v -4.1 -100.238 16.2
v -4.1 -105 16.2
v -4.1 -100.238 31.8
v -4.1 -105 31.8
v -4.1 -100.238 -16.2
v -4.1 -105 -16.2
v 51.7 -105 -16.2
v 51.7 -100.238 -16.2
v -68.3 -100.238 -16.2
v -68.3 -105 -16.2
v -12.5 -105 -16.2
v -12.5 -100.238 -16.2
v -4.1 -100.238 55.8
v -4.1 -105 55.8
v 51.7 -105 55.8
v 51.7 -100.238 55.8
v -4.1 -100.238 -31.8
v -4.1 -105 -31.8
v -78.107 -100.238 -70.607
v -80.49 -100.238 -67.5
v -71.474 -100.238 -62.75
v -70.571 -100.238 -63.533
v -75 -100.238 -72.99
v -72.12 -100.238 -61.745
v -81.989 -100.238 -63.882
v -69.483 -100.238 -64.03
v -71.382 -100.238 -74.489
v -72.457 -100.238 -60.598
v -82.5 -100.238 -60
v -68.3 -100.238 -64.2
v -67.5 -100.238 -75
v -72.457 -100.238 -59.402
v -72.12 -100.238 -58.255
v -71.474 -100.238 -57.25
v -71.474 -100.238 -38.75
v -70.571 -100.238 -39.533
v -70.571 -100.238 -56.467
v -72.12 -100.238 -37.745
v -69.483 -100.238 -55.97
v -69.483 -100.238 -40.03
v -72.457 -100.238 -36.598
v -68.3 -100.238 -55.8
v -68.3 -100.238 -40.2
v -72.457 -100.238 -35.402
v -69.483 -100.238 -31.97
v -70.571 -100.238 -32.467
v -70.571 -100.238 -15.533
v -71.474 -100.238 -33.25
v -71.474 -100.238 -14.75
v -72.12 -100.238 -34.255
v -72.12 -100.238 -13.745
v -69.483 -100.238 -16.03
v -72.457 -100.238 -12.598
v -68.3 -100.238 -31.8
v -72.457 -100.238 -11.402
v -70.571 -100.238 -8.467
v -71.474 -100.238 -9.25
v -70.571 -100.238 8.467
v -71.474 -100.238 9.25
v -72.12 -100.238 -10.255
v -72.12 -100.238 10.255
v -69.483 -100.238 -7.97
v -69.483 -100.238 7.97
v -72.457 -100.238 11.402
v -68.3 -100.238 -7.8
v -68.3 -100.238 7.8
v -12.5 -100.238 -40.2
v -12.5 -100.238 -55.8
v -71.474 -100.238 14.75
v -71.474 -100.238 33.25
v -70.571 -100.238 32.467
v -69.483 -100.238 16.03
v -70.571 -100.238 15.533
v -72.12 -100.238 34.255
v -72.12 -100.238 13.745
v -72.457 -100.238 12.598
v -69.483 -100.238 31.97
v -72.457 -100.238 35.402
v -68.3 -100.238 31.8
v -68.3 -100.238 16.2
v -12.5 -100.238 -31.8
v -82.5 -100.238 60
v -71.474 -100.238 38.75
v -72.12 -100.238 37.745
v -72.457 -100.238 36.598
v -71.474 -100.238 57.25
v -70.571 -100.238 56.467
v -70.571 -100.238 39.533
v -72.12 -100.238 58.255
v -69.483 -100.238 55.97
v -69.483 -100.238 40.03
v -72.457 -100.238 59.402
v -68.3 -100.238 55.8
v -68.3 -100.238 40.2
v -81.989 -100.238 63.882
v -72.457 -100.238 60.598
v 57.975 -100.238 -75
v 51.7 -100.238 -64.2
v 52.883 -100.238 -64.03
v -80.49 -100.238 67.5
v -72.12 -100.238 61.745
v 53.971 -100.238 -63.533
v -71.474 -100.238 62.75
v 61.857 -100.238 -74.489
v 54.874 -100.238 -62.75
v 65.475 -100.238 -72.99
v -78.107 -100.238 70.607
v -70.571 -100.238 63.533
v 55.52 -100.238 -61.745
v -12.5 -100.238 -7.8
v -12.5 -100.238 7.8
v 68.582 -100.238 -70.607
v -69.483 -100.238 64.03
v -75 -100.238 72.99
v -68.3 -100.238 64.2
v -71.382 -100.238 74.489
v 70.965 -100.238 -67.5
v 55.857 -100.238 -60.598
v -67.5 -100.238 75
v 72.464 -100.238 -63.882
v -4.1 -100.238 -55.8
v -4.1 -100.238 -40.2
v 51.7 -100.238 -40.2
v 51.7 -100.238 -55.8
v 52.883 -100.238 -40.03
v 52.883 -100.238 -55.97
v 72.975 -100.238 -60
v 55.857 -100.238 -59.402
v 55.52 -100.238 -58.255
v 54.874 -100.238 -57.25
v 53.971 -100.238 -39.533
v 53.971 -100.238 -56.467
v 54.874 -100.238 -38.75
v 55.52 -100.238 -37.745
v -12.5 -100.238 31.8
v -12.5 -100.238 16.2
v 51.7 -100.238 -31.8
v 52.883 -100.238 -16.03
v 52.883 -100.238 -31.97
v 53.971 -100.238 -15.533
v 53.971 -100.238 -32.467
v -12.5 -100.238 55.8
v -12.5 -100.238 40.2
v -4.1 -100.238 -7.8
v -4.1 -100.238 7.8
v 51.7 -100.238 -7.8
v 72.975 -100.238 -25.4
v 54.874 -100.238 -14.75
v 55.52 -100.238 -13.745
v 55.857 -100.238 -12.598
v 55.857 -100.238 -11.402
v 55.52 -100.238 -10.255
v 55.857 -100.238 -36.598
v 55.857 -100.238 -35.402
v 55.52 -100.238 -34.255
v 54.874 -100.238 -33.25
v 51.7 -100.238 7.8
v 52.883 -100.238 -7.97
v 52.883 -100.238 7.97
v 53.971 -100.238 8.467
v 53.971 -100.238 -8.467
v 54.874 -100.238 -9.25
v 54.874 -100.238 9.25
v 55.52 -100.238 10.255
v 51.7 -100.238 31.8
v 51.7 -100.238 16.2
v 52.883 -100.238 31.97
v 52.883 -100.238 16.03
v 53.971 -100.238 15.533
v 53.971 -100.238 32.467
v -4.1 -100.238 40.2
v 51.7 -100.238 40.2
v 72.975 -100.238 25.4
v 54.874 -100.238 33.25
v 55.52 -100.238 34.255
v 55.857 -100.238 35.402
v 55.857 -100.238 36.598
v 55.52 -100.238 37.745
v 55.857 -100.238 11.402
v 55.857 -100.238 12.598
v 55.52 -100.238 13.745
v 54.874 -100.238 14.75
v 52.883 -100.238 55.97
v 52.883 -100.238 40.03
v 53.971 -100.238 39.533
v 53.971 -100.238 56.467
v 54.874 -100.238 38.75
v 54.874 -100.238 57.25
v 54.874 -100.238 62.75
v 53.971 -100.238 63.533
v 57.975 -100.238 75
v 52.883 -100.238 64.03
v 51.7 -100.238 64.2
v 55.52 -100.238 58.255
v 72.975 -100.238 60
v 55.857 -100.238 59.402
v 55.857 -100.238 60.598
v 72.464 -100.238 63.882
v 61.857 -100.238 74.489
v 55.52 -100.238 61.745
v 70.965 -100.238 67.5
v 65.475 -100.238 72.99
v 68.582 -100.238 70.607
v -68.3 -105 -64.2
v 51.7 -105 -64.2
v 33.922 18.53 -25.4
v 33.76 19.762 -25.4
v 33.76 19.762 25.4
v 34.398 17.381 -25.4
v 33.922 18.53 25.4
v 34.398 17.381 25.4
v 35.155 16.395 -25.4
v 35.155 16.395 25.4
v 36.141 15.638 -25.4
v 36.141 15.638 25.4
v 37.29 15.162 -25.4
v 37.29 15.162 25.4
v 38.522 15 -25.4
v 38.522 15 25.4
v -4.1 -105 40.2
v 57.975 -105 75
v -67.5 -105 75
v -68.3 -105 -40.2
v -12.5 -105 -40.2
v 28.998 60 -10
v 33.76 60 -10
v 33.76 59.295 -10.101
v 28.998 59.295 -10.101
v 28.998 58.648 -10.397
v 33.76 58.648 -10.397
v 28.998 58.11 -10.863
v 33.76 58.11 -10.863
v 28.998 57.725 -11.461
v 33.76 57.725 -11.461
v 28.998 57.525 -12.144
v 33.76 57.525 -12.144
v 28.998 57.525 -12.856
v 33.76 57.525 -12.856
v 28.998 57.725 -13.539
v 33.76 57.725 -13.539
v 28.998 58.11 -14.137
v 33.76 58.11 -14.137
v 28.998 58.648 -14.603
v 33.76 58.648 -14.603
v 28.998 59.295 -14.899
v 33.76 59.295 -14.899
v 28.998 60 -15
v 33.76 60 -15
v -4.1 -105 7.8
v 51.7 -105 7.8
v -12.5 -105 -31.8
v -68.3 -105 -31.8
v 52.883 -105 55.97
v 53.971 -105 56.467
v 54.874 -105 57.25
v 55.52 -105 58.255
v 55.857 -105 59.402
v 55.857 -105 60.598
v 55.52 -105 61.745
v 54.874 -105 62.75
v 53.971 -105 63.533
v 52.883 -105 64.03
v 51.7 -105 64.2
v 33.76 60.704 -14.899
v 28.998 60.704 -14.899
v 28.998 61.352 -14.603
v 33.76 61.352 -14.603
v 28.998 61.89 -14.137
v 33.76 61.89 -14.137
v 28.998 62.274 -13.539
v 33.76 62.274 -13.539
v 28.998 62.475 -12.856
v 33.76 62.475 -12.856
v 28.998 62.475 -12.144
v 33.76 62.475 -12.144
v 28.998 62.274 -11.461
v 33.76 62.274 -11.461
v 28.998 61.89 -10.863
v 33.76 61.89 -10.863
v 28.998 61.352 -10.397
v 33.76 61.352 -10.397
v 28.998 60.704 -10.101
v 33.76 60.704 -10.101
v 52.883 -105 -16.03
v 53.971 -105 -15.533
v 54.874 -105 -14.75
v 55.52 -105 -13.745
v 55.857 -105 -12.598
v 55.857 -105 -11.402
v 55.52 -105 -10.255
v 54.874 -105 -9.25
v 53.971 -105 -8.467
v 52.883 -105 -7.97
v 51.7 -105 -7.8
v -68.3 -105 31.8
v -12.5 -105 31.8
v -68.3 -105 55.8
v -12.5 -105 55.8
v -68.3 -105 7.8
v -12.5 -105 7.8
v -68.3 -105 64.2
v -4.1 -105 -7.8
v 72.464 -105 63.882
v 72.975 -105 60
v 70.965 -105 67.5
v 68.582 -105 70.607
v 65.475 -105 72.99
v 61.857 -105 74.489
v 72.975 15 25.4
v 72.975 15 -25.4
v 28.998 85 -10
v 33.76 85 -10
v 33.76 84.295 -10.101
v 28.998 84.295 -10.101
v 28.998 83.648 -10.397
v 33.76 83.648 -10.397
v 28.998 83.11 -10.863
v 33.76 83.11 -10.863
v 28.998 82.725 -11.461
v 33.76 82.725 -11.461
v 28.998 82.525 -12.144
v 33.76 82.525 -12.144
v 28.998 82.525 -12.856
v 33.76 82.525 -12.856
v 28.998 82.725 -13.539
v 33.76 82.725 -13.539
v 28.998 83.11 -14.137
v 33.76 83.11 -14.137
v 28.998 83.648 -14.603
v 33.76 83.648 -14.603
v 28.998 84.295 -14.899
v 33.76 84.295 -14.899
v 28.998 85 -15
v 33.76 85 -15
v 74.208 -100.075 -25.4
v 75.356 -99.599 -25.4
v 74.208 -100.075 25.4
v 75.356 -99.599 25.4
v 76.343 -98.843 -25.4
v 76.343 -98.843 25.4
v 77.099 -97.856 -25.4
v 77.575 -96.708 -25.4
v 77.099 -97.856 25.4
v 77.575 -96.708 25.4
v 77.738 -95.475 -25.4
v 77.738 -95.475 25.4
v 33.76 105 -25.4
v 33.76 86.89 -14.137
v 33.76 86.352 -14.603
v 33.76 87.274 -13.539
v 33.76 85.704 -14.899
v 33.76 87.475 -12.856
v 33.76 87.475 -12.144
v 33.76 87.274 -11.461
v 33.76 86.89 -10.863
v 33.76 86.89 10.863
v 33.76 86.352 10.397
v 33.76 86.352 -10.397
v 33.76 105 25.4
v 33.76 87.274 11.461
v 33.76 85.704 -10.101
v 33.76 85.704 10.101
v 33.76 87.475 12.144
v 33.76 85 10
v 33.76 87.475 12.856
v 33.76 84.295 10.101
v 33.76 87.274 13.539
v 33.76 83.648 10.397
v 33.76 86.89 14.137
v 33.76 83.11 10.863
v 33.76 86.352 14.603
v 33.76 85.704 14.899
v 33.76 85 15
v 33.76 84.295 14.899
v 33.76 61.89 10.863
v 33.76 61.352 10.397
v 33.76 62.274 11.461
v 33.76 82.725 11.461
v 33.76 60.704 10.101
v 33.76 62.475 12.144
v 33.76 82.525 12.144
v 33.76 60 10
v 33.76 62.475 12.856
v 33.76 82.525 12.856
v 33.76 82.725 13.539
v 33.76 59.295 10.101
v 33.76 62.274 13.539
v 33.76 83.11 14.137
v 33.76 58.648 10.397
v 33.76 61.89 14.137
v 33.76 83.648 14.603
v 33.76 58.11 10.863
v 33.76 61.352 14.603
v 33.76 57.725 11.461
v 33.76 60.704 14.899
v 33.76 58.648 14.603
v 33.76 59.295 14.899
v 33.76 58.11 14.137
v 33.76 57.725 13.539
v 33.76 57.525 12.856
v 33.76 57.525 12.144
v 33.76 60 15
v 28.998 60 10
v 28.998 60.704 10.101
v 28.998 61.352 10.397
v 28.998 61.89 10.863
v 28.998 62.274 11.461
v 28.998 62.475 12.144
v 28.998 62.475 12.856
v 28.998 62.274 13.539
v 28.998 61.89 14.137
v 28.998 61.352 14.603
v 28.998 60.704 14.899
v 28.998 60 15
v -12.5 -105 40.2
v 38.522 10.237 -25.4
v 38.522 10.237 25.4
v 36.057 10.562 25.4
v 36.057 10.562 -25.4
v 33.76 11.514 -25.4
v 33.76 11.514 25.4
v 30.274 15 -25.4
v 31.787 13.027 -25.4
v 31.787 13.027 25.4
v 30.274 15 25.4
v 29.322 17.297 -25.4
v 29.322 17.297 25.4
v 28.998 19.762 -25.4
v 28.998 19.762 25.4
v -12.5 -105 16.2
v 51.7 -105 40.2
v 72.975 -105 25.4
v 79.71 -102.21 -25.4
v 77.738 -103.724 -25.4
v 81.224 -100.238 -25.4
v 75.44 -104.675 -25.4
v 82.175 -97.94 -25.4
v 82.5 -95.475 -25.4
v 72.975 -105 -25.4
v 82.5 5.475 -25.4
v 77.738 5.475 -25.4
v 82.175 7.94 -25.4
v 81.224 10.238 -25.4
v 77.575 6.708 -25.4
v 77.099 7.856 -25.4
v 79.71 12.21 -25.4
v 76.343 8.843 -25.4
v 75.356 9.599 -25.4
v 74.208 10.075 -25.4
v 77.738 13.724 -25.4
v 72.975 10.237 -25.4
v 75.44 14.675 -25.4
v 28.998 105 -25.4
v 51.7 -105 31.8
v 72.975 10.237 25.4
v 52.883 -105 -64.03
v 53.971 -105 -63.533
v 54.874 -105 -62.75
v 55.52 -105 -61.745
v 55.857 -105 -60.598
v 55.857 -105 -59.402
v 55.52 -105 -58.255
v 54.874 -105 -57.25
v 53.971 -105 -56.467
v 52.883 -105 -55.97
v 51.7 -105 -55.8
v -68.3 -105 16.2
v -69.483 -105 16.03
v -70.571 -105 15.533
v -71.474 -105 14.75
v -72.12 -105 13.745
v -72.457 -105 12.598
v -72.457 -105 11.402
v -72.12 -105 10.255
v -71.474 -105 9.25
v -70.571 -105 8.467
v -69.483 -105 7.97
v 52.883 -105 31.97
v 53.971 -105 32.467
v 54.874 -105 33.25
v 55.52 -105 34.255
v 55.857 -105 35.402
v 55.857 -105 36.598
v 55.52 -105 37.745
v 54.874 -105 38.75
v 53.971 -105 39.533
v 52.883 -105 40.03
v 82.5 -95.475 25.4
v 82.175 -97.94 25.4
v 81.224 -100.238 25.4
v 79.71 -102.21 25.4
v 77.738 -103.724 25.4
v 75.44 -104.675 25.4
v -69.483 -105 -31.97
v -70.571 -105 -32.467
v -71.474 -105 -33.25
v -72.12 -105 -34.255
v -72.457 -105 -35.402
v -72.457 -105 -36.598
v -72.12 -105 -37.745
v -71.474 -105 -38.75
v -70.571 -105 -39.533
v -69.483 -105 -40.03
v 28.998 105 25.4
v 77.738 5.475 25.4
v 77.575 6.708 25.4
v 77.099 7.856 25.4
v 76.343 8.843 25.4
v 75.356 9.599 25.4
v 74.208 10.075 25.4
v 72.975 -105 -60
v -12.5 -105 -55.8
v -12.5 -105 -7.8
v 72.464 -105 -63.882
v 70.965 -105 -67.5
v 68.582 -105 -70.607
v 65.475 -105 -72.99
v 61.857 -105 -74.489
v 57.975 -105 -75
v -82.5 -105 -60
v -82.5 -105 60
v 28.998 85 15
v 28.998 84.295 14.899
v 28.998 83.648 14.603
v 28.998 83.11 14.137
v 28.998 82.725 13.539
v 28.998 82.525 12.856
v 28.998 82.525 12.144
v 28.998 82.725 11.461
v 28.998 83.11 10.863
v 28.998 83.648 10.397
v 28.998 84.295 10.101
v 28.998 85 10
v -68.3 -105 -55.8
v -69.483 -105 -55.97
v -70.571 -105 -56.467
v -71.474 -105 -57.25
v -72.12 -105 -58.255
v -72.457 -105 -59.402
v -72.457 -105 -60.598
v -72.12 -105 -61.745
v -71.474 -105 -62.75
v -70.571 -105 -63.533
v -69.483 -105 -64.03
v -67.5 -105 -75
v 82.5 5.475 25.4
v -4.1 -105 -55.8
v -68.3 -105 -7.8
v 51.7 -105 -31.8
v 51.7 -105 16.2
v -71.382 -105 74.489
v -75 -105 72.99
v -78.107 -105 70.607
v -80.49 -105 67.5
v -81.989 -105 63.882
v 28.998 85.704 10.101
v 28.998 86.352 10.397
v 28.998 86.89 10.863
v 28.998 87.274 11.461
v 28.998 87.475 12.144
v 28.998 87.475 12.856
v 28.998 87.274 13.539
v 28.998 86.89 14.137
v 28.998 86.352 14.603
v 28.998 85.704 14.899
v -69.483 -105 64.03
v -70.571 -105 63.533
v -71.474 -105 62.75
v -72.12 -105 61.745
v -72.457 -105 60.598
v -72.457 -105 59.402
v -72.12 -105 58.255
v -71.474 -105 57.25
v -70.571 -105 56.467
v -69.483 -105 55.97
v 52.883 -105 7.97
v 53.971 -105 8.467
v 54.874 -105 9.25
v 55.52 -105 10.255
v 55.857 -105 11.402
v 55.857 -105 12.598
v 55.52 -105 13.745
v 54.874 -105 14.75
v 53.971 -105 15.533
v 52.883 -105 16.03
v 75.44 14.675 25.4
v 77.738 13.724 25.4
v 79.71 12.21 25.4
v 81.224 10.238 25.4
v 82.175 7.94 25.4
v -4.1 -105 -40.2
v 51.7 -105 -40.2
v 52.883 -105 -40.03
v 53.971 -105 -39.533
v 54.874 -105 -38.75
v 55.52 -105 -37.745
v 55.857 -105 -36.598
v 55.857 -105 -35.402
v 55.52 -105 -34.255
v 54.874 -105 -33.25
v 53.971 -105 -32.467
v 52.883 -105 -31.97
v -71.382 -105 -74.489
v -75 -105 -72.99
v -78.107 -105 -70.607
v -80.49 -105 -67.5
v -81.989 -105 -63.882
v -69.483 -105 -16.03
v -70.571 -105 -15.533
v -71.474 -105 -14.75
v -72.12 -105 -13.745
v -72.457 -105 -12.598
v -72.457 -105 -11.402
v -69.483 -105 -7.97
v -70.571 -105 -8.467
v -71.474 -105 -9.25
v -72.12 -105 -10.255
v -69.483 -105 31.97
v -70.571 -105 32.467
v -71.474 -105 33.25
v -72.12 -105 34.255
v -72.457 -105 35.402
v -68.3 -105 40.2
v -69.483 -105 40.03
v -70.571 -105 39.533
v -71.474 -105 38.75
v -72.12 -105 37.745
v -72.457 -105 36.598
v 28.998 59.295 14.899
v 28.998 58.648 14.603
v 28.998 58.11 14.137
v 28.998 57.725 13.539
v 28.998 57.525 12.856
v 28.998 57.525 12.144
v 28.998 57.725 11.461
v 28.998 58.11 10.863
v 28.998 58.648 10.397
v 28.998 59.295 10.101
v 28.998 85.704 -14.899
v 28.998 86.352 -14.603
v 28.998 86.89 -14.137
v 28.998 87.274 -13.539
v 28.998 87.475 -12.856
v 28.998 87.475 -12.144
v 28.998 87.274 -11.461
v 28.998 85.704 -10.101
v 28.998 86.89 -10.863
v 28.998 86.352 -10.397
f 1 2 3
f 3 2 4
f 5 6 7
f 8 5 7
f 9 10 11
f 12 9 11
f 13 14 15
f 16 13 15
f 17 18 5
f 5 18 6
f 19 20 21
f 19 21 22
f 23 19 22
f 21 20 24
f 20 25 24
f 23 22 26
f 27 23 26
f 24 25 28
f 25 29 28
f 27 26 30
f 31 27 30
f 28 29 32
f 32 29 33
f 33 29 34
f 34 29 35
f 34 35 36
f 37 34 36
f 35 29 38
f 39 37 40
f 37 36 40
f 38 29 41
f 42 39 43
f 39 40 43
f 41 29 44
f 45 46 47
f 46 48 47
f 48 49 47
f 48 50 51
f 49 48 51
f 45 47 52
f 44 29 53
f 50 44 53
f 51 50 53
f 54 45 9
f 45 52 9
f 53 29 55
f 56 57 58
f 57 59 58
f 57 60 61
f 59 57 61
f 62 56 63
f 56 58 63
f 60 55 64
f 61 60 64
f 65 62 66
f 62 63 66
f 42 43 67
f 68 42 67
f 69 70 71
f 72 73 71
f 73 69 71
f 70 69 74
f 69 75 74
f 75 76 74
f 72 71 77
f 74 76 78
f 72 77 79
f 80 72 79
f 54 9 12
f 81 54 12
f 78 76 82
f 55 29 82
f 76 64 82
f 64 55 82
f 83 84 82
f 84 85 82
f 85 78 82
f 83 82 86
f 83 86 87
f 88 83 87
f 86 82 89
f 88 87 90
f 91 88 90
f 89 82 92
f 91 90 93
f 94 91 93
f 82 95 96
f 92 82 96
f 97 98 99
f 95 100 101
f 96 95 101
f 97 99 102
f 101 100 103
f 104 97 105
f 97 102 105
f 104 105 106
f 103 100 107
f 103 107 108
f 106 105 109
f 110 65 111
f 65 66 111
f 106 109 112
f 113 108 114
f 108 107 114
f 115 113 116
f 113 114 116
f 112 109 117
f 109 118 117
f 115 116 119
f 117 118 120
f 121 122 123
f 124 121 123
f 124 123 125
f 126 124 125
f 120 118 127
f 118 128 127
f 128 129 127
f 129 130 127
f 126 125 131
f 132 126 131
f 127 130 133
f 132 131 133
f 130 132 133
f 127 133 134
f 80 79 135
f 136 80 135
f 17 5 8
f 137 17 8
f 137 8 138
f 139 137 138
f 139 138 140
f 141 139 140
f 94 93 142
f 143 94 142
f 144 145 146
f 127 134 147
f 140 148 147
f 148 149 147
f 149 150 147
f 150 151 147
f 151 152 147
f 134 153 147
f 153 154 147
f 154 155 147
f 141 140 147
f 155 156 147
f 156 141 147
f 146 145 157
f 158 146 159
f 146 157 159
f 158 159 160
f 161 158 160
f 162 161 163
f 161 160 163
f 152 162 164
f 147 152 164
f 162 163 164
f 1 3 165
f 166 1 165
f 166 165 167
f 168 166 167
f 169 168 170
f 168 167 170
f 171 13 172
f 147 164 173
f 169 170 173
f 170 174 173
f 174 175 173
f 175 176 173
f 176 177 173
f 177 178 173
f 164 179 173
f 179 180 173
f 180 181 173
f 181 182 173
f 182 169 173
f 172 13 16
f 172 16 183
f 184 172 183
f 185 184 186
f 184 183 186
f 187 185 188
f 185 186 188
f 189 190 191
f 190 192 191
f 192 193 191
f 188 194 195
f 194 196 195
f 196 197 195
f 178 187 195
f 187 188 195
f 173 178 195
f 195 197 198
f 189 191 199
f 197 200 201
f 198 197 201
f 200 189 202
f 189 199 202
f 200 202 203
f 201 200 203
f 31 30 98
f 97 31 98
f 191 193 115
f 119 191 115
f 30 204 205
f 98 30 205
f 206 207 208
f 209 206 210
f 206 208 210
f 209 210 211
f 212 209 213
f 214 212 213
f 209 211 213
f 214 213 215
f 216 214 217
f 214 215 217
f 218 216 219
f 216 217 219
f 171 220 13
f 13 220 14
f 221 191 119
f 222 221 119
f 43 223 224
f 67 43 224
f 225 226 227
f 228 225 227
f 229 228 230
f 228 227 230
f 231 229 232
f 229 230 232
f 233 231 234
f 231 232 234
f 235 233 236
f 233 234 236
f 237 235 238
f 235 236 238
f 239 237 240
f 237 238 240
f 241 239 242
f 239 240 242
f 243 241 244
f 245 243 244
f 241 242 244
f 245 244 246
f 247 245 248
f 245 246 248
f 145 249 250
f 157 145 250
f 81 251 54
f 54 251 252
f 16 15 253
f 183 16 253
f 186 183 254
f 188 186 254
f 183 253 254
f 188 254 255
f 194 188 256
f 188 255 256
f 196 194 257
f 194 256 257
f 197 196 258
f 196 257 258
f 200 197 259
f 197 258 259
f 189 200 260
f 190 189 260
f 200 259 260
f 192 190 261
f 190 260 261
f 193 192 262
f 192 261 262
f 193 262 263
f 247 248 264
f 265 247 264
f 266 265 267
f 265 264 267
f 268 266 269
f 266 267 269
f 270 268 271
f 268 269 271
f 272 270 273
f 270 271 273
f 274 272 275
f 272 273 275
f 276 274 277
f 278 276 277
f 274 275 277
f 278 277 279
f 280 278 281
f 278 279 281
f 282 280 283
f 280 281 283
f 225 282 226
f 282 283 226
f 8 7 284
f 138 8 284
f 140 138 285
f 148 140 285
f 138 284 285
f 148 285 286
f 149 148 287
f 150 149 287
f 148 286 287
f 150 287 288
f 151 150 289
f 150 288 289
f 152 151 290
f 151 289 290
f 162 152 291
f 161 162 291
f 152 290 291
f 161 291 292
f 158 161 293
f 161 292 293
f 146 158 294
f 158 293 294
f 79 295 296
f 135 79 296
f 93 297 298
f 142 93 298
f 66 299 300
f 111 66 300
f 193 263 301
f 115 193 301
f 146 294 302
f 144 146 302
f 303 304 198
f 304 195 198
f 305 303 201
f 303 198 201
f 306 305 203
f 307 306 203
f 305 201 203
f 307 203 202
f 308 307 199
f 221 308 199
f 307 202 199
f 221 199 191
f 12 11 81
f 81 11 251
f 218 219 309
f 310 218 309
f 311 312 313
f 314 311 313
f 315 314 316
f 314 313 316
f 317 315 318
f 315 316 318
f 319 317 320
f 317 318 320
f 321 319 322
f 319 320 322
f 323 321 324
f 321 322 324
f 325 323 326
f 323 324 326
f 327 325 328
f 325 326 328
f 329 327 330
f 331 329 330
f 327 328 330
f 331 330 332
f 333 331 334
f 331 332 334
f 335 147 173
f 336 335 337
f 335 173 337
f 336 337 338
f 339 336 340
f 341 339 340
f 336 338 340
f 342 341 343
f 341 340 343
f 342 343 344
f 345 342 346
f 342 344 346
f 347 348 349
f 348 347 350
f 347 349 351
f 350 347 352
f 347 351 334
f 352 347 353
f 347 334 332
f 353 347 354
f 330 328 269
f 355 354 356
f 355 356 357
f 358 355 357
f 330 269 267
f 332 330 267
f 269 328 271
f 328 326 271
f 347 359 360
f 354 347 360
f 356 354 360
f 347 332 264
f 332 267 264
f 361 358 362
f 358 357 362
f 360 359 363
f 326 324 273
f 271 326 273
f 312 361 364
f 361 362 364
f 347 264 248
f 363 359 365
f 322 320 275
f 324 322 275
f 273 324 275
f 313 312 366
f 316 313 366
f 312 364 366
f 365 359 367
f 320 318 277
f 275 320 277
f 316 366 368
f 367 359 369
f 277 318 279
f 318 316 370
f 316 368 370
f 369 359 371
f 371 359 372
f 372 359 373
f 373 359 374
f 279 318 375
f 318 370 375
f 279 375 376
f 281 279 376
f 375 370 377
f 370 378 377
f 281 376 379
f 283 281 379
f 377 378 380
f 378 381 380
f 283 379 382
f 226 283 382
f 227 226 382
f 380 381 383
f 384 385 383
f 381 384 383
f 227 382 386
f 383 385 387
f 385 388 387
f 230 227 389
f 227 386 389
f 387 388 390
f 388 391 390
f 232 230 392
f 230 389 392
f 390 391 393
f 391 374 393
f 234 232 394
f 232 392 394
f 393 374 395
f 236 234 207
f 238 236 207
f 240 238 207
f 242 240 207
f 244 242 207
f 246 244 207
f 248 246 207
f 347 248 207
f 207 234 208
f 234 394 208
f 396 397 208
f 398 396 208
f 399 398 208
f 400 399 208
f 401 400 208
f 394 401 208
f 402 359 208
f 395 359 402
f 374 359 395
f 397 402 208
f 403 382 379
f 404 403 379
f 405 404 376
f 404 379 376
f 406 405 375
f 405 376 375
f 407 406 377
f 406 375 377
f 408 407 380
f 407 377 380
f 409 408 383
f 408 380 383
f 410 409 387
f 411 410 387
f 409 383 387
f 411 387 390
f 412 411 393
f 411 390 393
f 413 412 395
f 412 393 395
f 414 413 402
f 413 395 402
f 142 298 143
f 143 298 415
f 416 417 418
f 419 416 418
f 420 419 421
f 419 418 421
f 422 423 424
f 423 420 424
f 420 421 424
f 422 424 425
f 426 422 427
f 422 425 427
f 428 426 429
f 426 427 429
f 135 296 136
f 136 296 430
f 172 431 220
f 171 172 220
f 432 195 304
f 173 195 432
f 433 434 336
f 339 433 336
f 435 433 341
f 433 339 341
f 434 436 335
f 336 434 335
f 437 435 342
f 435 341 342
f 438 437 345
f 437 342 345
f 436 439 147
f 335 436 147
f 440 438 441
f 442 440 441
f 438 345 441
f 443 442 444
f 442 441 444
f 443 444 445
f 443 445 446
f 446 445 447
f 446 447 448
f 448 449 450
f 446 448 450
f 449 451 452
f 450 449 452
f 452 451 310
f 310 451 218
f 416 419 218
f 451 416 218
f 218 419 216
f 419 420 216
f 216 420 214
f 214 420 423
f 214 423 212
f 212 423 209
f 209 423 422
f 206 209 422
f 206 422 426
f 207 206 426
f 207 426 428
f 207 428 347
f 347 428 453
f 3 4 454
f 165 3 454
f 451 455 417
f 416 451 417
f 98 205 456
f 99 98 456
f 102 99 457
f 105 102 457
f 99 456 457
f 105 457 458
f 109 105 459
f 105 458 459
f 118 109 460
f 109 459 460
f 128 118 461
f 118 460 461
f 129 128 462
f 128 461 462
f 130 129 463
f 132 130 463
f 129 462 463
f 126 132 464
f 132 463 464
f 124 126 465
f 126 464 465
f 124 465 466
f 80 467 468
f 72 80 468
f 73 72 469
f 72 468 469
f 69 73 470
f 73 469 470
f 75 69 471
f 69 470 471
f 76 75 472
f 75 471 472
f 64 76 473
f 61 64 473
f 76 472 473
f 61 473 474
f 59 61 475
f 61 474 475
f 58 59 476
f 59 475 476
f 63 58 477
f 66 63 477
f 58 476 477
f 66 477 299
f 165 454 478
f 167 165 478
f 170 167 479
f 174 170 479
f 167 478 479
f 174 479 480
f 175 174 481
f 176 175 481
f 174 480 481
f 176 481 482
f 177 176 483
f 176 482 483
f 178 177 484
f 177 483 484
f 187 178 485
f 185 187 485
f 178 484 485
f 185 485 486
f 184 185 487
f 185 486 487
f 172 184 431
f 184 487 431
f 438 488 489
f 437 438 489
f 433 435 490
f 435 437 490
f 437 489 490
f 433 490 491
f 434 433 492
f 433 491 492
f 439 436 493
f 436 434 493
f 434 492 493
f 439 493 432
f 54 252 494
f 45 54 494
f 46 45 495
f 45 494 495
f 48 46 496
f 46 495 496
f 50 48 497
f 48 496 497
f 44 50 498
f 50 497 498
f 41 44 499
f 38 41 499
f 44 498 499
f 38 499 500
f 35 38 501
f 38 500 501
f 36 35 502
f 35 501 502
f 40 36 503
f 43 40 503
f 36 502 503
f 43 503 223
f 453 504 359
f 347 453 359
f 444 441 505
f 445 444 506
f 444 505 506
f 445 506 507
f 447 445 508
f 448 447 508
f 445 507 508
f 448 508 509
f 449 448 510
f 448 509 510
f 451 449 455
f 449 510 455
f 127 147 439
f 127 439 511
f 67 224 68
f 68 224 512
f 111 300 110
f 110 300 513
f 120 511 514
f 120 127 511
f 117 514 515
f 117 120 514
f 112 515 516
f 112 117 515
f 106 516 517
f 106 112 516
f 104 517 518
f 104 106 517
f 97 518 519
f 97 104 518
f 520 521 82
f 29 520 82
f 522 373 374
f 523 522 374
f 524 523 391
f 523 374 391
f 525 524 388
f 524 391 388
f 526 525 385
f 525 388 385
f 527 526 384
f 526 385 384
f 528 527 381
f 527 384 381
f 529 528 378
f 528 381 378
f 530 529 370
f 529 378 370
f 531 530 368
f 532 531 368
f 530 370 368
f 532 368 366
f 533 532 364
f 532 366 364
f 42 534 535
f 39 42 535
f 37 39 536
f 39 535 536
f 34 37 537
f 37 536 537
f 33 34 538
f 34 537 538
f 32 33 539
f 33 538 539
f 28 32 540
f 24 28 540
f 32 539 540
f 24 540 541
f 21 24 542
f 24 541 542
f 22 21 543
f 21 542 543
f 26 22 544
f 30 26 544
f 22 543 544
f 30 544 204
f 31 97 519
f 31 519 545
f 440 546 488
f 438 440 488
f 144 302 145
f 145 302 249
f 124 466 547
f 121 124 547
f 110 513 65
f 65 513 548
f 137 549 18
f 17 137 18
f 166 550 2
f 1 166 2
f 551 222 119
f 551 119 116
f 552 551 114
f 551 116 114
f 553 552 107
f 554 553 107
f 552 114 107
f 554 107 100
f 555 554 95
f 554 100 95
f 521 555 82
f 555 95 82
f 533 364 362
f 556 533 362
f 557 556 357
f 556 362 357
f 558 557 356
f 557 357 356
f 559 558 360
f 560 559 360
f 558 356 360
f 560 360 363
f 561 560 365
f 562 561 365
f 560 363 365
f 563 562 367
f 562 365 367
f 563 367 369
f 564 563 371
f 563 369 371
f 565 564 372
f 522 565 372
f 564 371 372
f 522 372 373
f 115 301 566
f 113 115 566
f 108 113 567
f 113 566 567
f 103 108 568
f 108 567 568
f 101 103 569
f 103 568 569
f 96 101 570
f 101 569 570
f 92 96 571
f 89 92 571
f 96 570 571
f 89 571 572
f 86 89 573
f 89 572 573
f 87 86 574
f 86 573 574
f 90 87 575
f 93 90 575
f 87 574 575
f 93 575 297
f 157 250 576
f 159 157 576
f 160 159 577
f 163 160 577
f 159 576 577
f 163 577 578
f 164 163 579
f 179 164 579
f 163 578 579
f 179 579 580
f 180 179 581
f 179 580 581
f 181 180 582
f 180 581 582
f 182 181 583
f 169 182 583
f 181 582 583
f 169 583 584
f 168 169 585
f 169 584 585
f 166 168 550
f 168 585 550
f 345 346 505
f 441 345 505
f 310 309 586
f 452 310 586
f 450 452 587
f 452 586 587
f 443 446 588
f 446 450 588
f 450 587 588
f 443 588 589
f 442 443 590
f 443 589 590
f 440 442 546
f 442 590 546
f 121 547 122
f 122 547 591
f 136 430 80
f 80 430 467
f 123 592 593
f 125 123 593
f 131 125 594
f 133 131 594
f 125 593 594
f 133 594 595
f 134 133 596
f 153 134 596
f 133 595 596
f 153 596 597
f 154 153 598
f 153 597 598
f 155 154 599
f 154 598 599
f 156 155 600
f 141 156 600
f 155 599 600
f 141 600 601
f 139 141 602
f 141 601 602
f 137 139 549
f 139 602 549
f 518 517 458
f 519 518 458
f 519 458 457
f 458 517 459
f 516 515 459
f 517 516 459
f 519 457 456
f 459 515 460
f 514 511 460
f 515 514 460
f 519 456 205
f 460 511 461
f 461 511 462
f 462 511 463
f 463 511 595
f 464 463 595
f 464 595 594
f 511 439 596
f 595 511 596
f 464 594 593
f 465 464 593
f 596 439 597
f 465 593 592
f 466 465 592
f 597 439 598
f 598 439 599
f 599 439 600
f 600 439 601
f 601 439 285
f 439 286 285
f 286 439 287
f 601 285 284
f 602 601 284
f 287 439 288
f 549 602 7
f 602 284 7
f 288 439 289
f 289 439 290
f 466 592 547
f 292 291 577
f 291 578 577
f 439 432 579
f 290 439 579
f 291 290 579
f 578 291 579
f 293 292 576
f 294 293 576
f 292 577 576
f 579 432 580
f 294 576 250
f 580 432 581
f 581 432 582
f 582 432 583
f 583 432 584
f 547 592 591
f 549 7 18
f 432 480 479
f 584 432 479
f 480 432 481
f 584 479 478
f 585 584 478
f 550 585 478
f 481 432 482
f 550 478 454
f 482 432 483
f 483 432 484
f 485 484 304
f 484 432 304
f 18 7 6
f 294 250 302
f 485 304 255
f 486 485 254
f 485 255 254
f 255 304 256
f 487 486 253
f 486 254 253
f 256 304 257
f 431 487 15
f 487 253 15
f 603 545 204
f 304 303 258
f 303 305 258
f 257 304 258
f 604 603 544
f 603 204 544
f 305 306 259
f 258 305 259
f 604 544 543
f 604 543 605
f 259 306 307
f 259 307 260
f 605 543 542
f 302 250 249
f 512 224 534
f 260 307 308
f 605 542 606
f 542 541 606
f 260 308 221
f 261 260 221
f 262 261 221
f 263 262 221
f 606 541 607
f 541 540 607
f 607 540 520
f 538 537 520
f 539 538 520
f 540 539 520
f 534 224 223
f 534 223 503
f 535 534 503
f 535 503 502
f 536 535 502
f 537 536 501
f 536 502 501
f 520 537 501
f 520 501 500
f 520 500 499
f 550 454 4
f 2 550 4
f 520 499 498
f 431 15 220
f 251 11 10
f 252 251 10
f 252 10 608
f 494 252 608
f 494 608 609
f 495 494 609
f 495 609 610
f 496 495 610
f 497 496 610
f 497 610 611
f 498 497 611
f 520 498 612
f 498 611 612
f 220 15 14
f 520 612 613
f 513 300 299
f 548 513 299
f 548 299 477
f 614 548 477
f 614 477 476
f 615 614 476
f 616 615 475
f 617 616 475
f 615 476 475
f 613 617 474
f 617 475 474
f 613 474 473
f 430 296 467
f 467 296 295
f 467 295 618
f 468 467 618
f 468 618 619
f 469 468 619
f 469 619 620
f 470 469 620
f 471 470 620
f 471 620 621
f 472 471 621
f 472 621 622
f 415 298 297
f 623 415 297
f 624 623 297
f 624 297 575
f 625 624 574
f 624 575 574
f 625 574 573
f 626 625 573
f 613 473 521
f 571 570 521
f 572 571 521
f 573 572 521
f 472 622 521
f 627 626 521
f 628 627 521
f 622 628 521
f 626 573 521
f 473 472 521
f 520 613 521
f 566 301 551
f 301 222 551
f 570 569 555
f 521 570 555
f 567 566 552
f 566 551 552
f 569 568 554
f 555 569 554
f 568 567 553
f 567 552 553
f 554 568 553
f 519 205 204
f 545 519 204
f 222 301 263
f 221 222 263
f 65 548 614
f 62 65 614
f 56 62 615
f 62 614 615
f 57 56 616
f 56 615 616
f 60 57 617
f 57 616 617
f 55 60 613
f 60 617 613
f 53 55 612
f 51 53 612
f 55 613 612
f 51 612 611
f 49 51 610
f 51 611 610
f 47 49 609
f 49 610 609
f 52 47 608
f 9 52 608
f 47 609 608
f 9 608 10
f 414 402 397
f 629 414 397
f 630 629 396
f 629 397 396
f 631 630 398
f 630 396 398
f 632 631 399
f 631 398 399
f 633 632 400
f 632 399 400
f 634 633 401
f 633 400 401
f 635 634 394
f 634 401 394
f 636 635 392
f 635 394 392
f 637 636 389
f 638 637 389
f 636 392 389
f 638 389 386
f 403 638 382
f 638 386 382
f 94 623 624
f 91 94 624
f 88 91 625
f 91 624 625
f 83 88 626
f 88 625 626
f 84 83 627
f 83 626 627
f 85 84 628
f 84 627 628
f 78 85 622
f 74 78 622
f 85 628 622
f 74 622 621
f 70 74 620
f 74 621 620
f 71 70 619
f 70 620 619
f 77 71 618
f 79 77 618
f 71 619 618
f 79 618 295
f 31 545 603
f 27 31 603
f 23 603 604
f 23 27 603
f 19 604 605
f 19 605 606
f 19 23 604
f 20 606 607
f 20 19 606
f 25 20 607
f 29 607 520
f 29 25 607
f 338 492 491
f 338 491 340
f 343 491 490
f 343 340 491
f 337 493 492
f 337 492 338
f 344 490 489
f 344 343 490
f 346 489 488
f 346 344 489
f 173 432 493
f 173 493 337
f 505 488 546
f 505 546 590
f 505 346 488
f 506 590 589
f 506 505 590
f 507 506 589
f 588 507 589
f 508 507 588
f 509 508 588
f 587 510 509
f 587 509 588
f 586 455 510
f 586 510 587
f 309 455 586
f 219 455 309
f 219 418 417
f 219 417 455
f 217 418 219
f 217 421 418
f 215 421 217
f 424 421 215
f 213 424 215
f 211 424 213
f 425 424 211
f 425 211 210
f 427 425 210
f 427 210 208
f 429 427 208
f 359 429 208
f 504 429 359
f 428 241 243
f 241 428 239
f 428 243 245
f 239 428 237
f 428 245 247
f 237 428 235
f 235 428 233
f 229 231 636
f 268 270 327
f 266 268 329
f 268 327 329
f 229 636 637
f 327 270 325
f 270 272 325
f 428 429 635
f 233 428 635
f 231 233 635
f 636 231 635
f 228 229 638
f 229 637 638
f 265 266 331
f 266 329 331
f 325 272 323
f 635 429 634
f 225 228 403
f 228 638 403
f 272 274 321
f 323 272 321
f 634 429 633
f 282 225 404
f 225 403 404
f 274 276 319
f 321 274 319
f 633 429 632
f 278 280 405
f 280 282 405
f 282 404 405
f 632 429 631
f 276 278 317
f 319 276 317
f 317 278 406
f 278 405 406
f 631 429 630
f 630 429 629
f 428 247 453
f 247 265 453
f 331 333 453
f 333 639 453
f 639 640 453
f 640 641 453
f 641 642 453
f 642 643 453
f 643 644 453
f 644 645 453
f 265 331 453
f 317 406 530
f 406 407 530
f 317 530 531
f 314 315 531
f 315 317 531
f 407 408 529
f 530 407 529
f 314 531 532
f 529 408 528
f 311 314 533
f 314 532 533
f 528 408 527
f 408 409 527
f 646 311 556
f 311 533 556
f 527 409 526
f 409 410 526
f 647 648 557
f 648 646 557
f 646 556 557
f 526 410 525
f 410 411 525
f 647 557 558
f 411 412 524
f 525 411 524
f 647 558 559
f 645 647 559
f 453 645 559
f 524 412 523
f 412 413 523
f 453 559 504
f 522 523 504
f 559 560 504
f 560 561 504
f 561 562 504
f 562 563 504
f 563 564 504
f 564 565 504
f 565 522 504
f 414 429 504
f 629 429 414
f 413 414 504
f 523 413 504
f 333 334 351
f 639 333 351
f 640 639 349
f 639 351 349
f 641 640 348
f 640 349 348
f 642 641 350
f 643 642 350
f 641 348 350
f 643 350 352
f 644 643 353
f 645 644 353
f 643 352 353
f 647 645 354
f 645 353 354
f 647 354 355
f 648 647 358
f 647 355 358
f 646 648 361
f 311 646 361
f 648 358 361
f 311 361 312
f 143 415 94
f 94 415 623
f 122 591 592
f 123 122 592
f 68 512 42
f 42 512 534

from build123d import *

# Parameters (mm, degrees)
BRIDA_BASE1_DEPTH           = 75
CORTAR_EXTRUIR1_START       = -9.525
CORTAR_EXTRUIR1_OUTLINE_W   = 49.6
CORTAR_EXTRUIR1_OUTLINE_H   = 121
CORTAR_EXTRUIR1_DEPTH       = 9.525
CORTAR_EXTRUIR1_START_2     = -53.5025
CORTAR_EXTRUIR1_2_OUTLINE_W = 49.6
CORTAR_EXTRUIR1_2_OUTLINE_H = 94.7625
CORTAR_EXTRUIR1_2_DEPTH     = 43.9775
CORTAR_EXTRUIR2_DEPTH       = 10
CORTAR_EXTRUIR3_DEPTH       = 10
REDONDEO1_R                 = 15


# Read off the part's stored shape, not the designer's step: Cortar-Extruir1
# Sheet-metal steps are written as plain solids
with BuildPart() as part:
    # Croquis1 → Brida base1 (new, symmetric)
    with BuildSketch(Plane.XY):
        with BuildLine():
            Line((33.76, 105), (33.76, 19.7625))
            ThreePointArc((33.76, 19.7625), (35.154903955, 16.394903955), (38.5225, 15))
            Line((38.5225, 15), (72.975, 15))
            ThreePointArc((72.975, 15), (79.710192091, 12.210192091), (82.5, 5.475))
            Line((82.5, 5.475), (82.5, -95.475))
            ThreePointArc((82.5, -95.475), (79.710192091, -102.210192091), (72.975, -105))
            Line((72.975, -105), (-82.5, -105))
            Line((-82.5, -105), (-82.5, -100.2375))
            Line((-82.5, -100.2375), (72.975, -100.2375))
            ThreePointArc((72.975, -100.2375), (76.342596045, -98.842596045), (77.7375, -95.475))
            Line((77.7375, -95.475), (77.7375, 5.475))
            ThreePointArc((77.7375, 5.475), (76.342596045, 8.842596045), (72.975, 10.2375))
            Line((72.975, 10.2375), (38.5225, 10.2375))
            ThreePointArc((38.5225, 10.2375), (31.787307909, 13.027307909), (28.9975, 19.7625))
            Line((28.9975, 19.7625), (28.9975, 105))
            Line((28.9975, 105), (33.76, 105))
        make_face()
    extrude(amount=BRIDA_BASE1_DEPTH, both=True)

    # Cortar-Extruir1 outline → Cortar-Extruir1 (cut)
    with BuildSketch(Plane(origin=(82.5, 0, 0), x_dir=(0, 0, -1), z_dir=(1, 0, 0)).offset(CORTAR_EXTRUIR1_START)):
        with Locations((50.2, -45.5)):
            Rectangle(CORTAR_EXTRUIR1_OUTLINE_W, CORTAR_EXTRUIR1_OUTLINE_H)
        with Locations((-50.2, -45.5)):
            Rectangle(CORTAR_EXTRUIR1_OUTLINE_W, CORTAR_EXTRUIR1_OUTLINE_H)
    extrude(amount=CORTAR_EXTRUIR1_DEPTH, mode=Mode.SUBTRACT)

    # Cortar-Extruir1 2 outline → Cortar-Extruir1 2 (cut)
    with BuildSketch(Plane(origin=(82.5, 0, 0), x_dir=(0, 0, -1), z_dir=(1, 0, 0)).offset(CORTAR_EXTRUIR1_START_2)):
        with Locations((50.2, 57.61875)):
            Rectangle(CORTAR_EXTRUIR1_2_OUTLINE_W, CORTAR_EXTRUIR1_2_OUTLINE_H)
        with Locations((-50.2, 57.61875)):
            Rectangle(CORTAR_EXTRUIR1_2_OUTLINE_W, CORTAR_EXTRUIR1_2_OUTLINE_H)
    extrude(amount=CORTAR_EXTRUIR1_2_DEPTH, mode=Mode.SUBTRACT)

    # Croquis7 → Cortar-Extruir2 (cut)
    with BuildSketch(Plane(origin=(33.76, 0, 0), x_dir=(0, 0, -1), z_dir=(1, 0, 0))):
        with BuildLine():
            ThreePointArc((-15, 84.9995), (-12.5, 82.4995), (-10, 84.9995))
            ThreePointArc((-10, 84.9995), (-12.5, 87.5005), (-15, 84.9995))
        make_face()
        with BuildLine():
            ThreePointArc((10, 84.9995), (12.5, 82.4995), (15, 84.9995))
            ThreePointArc((15, 84.9995), (12.5, 87.5005), (10, 84.9995))
        make_face()
        with BuildLine():
            ThreePointArc((10, 59.9995), (12.5, 57.4995), (15, 59.9995))
            ThreePointArc((15, 59.9995), (12.5, 62.5005), (10, 59.9995))
        make_face()
        with BuildLine():
            ThreePointArc((-15, 59.9995), (-12.5, 57.4995), (-10, 59.9995))
            ThreePointArc((-10, 59.9995), (-12.5, 62.5005), (-15, 59.9995))
        make_face()
    extrude(amount=-CORTAR_EXTRUIR2_DEPTH, mode=Mode.SUBTRACT)

    # Croquis8 → Cortar-Extruir3 (cut)
    with BuildSketch(Plane.XZ.offset(105)):
        with BuildLine():
            Line((-68.3, -64.2), (51.7, -64.2))
            ThreePointArc((51.7, -64.2), (55.9, -60), (51.7, -55.8))
            Line((51.7, -55.8), (-4.1, -55.8))
            Line((-4.1, -55.8), (-4.1, -40.2))
            Line((-4.1, -40.2), (51.7, -40.2))
            ThreePointArc((51.7, -40.2), (55.9, -36), (51.7, -31.8))
            Line((51.7, -31.8), (-4.1, -31.8))
            Line((-4.1, -31.8), (-4.1, -16.2))
            Line((-4.1, -16.2), (51.7, -16.2))
            ThreePointArc((51.7, -16.2), (55.9, -12), (51.7, -7.8))
            Line((51.7, -7.8), (-4.1, -7.8))
            Line((-4.1, -7.8), (-4.1, 7.8))
            Line((-4.1, 7.8), (51.7, 7.8))
            ThreePointArc((51.7, 7.8), (55.9, 12), (51.7, 16.2))
            Line((51.7, 16.2), (-4.1, 16.2))
            Line((-4.1, 16.2), (-4.1, 31.8))
            Line((-4.1, 31.8), (51.7, 31.8))
            ThreePointArc((51.7, 31.8), (55.9, 36), (51.7, 40.2))
            Line((51.7, 40.2), (-4.1, 40.2))
            Line((-4.1, 40.2), (-4.1, 55.8))
            Line((-4.1, 55.8), (51.7, 55.8))
            ThreePointArc((51.7, 55.8), (55.9, 60), (51.7, 64.2))
            Line((51.7, 64.2), (-68.3, 64.2))
            ThreePointArc((-68.3, 64.2), (-72.5, 60), (-68.3, 55.8))
            Line((-68.3, 55.8), (-12.5, 55.8))
            Line((-12.5, 55.8), (-12.5, 40.2))
            Line((-12.5, 40.2), (-68.3, 40.2))
            ThreePointArc((-68.3, 40.2), (-72.5, 36), (-68.3, 31.8))
            Line((-68.3, 31.8), (-12.5, 31.8))
            Line((-12.5, 31.8), (-12.5, 16.2))
            Line((-12.5, 16.2), (-68.3, 16.2))
            ThreePointArc((-68.3, 16.2), (-72.5, 12), (-68.3, 7.8))
            Line((-68.3, 7.8), (-12.5, 7.8))
            Line((-12.5, 7.8), (-12.5, -7.8))
            Line((-12.5, -7.8), (-68.3, -7.8))
            ThreePointArc((-68.3, -7.8), (-72.5, -12), (-68.3, -16.2))
            Line((-68.3, -16.2), (-12.5, -16.2))
            Line((-12.5, -16.2), (-12.5, -31.8))
            Line((-12.5, -31.8), (-68.3, -31.8))
            ThreePointArc((-68.3, -31.8), (-72.5, -36), (-68.3, -40.2))
            Line((-68.3, -40.2), (-12.5, -40.2))
            Line((-12.5, -40.2), (-12.5, -55.8))
            Line((-12.5, -55.8), (-68.3, -55.8))
            ThreePointArc((-68.3, -55.8), (-72.5, -60), (-68.3, -64.2))
        make_face()
    extrude(amount=-CORTAR_EXTRUIR3_DEPTH, mode=Mode.SUBTRACT)

    # Redondeo1
    redondeo1_edges = [part.edges().sort_by_distance(p)[0] for p in [
        (-82.5, -102.61875, -75),
        (72.975, -102.61875, -75),
        (72.975, -102.61875, 75),
        (-82.5, -102.61875, 75),
    ]]
    fillet(redondeo1_edges, radius=REDONDEO1_R)


solid = part.part
